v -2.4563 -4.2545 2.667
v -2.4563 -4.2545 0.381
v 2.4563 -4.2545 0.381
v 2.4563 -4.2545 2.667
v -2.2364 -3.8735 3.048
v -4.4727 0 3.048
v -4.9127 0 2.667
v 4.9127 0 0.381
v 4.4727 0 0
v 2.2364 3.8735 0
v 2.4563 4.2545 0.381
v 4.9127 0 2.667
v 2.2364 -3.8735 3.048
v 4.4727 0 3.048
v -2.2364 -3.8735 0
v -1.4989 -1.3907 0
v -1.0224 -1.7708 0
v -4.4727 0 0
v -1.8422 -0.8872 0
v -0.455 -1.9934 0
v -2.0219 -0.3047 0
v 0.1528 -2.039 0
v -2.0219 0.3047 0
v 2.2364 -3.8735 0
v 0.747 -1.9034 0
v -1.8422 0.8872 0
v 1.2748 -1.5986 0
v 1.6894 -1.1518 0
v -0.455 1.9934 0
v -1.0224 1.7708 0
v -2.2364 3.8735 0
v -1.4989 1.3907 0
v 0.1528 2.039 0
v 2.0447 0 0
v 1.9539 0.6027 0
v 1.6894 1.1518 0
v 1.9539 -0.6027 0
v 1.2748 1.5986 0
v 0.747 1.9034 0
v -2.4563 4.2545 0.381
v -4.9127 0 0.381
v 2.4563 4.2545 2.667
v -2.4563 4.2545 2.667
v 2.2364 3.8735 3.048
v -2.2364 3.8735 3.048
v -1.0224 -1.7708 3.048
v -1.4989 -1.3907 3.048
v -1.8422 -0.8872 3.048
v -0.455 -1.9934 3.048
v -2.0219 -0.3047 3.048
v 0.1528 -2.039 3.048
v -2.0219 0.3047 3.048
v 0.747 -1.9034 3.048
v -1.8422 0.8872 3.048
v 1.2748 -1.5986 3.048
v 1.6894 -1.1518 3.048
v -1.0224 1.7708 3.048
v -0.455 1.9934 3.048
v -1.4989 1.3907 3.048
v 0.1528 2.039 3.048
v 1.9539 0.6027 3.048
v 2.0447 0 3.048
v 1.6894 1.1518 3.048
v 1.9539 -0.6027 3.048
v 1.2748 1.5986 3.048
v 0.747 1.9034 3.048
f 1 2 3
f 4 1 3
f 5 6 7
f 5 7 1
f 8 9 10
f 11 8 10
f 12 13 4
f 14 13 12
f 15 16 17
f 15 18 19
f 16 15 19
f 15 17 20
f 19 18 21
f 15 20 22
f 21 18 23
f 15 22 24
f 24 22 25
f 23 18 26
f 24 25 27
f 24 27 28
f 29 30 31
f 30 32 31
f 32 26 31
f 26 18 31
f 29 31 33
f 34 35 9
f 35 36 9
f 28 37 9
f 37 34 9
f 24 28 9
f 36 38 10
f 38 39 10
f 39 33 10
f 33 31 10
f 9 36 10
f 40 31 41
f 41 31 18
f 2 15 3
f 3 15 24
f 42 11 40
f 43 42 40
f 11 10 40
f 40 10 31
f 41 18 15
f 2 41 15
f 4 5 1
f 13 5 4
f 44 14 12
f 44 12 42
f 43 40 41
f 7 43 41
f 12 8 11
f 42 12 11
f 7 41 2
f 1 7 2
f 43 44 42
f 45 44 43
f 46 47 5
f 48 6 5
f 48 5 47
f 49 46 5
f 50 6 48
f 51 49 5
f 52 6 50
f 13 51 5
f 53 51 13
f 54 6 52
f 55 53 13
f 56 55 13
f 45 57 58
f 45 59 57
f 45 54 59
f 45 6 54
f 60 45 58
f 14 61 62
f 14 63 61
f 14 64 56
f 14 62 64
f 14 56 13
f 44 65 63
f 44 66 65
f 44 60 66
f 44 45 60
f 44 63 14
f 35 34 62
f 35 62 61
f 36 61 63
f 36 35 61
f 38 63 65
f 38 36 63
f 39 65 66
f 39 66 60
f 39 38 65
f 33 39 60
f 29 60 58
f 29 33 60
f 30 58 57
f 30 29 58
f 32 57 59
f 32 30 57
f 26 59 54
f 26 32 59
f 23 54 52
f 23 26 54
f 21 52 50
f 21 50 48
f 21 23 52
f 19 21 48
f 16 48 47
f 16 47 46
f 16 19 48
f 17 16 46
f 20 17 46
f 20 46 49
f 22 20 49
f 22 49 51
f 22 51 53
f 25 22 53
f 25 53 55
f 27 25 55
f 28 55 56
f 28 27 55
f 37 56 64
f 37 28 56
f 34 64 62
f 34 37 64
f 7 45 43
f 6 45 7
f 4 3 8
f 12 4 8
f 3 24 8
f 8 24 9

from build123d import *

# Parameters (mm, degrees)
F0_R     = 2.0447
F1_DEPTH = 3.048
F2_SIZE  = 0.381


with BuildPart() as f1:
    # F0 (on Top) → F1 (new body)
    with BuildSketch(Plane.XY):
        Polygon((-2.456337, -4.2545), (2.456337, -4.2545), (4.912673, 0), (2.456337, 4.2545), (-2.456337, 4.2545), (-4.912673, 0), align=None)
        Circle(F0_R, mode=Mode.SUBTRACT)
    extrude(amount=F1_DEPTH)

    # F2
    f2_edges = [f1.edges().sort_by_distance(p)[0] for p in [
        (3.684505, -2.12725, 3.048),
        (0, -4.2545, 3.048),
        (-3.684505, -2.12725, 3.048),
        (-3.684505, 2.12725, 3.048),
        (0, 4.2545, 3.048),
        (3.684505, 2.12725, 3.048),
        (0, -4.2545, 0),
        (-3.684505, -2.12725, 0),
        (3.684505, -2.12725, 0),
        (3.684505, 2.12725, 0),
        (0, 4.2545, 0),
        (-3.684505, 2.12725, 0),
    ]]
    chamfer(f2_edges, length=F2_SIZE)


solid = f1.part
